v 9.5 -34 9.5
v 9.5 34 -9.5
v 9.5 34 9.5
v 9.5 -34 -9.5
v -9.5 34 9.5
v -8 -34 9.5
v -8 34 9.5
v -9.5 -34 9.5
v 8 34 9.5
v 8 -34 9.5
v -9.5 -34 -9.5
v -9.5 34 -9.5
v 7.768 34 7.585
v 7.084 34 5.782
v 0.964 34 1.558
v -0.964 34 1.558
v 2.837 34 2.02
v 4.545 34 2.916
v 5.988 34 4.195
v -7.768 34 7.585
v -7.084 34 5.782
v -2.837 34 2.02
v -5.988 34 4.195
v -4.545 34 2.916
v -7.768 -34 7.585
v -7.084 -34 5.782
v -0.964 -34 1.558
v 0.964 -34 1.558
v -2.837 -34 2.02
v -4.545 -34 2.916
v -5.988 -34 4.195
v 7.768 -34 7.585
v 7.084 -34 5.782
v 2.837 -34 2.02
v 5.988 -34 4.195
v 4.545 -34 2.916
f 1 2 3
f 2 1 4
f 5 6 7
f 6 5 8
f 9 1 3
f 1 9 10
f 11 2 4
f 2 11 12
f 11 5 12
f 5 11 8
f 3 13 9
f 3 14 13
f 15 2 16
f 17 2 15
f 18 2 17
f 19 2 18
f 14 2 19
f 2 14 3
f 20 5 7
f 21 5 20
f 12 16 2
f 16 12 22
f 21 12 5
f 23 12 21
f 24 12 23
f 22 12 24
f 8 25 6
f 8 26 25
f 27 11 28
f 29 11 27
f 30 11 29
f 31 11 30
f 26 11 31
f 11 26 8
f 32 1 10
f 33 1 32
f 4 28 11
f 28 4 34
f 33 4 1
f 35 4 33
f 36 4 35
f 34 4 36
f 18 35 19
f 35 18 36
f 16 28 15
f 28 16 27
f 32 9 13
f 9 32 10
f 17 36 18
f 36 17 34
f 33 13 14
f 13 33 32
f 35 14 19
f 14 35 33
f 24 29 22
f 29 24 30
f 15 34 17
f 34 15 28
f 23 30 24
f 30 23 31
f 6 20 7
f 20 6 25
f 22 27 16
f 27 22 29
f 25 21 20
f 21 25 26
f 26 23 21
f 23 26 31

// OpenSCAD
ramp_width  = 19; //The width of the cubed block forming the outer shell of the ramp. 
ramp_length = 68; //The length of the " ".
ramp_height = 19; //The height of the " ".
/*A difference of the cubed outer hull of the ramp and the cylinder that carves out
the functional part of the ramp down which a marble of roughly 16 mm in diameter will slide.
The 8mm radius of the cylinder is to snugly accomodate the marble diameter.
The 90 degree rotation is due to the fact that the hull is horizontal lengthwise, and
cylinders default to a vertical orientation.
The translation of half the ramp height is so that the marble is not fully enclosed.*/
difference(){
    cube  (size = [ ramp_width, ramp_length, ramp_height],center= true); 
    rotate ( [90, 0, 0] ){
        translate([0, ramp_height/2, 0])   
        cylinder (r = 8, h = ramp_length, center = true);
     
    }
}

// these line7 paramenters specifically aare strange because we have to define another axis. The axis defined seems like it isnt the correct one but remembering that cylenders are rendered upwards, it makes sense because we have already rotated along the y axis    
// Right now I am having issues rendering but am going to assume it's the programs fault because the code was rendering fine earlier.
// difference is used to make sure the program knows that the following is "negative space"
//not sure why scad likes that term?
// def all parameters
